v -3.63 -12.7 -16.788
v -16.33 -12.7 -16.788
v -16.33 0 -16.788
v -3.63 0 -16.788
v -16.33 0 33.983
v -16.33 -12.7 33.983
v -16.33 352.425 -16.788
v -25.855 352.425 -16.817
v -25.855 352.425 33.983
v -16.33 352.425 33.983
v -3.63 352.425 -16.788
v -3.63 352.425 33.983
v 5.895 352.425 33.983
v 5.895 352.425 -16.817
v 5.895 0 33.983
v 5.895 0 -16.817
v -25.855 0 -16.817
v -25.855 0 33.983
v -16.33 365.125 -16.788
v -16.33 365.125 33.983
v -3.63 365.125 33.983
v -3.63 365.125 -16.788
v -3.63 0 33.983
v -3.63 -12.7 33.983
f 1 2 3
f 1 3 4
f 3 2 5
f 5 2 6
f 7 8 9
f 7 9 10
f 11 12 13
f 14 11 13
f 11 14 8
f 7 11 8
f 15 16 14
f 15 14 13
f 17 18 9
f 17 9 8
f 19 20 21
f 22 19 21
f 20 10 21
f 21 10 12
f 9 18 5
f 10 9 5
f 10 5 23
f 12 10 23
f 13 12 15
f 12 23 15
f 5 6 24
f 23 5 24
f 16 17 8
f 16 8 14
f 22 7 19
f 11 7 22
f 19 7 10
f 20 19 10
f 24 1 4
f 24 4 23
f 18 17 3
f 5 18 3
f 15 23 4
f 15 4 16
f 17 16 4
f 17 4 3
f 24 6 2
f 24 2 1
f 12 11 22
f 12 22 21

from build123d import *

# Parameters (mm, degrees)
F0_W     = 12.7
F0_H     = 50.77157
F1_DEPTH = 12.7
F2_DEPTH = 365.125
F3_DEPTH = 352.425


with BuildPart() as f1:
    # F0 (on Front) → F1 (new body)
    with BuildSketch(Plane.XZ):
        with Locations((-9.980159, 8.597515)):
            Rectangle(F0_W, F0_H)
    extrude(amount=F1_DEPTH)

    # F0 (on Front) → F2 (join)
    with BuildSketch(Plane.XZ):
        with Locations((-9.980159, 8.597515)):
            Rectangle(F0_W, F0_H)
    extrude(amount=-F2_DEPTH)

    # F0 (on Front) → F3 (join)
    with BuildSketch(Plane.XZ):
        Polygon((-16.330159, 33.9833), (-25.855159, 33.9833), (-25.855159, -16.8167), (5.894841, -16.8167), (5.894841, 33.9833), (-3.630159, 33.9833), (-3.630159, -16.78827), (-16.330159, -16.78827), align=None)
    extrude(amount=-F3_DEPTH)


solid = f1.part
